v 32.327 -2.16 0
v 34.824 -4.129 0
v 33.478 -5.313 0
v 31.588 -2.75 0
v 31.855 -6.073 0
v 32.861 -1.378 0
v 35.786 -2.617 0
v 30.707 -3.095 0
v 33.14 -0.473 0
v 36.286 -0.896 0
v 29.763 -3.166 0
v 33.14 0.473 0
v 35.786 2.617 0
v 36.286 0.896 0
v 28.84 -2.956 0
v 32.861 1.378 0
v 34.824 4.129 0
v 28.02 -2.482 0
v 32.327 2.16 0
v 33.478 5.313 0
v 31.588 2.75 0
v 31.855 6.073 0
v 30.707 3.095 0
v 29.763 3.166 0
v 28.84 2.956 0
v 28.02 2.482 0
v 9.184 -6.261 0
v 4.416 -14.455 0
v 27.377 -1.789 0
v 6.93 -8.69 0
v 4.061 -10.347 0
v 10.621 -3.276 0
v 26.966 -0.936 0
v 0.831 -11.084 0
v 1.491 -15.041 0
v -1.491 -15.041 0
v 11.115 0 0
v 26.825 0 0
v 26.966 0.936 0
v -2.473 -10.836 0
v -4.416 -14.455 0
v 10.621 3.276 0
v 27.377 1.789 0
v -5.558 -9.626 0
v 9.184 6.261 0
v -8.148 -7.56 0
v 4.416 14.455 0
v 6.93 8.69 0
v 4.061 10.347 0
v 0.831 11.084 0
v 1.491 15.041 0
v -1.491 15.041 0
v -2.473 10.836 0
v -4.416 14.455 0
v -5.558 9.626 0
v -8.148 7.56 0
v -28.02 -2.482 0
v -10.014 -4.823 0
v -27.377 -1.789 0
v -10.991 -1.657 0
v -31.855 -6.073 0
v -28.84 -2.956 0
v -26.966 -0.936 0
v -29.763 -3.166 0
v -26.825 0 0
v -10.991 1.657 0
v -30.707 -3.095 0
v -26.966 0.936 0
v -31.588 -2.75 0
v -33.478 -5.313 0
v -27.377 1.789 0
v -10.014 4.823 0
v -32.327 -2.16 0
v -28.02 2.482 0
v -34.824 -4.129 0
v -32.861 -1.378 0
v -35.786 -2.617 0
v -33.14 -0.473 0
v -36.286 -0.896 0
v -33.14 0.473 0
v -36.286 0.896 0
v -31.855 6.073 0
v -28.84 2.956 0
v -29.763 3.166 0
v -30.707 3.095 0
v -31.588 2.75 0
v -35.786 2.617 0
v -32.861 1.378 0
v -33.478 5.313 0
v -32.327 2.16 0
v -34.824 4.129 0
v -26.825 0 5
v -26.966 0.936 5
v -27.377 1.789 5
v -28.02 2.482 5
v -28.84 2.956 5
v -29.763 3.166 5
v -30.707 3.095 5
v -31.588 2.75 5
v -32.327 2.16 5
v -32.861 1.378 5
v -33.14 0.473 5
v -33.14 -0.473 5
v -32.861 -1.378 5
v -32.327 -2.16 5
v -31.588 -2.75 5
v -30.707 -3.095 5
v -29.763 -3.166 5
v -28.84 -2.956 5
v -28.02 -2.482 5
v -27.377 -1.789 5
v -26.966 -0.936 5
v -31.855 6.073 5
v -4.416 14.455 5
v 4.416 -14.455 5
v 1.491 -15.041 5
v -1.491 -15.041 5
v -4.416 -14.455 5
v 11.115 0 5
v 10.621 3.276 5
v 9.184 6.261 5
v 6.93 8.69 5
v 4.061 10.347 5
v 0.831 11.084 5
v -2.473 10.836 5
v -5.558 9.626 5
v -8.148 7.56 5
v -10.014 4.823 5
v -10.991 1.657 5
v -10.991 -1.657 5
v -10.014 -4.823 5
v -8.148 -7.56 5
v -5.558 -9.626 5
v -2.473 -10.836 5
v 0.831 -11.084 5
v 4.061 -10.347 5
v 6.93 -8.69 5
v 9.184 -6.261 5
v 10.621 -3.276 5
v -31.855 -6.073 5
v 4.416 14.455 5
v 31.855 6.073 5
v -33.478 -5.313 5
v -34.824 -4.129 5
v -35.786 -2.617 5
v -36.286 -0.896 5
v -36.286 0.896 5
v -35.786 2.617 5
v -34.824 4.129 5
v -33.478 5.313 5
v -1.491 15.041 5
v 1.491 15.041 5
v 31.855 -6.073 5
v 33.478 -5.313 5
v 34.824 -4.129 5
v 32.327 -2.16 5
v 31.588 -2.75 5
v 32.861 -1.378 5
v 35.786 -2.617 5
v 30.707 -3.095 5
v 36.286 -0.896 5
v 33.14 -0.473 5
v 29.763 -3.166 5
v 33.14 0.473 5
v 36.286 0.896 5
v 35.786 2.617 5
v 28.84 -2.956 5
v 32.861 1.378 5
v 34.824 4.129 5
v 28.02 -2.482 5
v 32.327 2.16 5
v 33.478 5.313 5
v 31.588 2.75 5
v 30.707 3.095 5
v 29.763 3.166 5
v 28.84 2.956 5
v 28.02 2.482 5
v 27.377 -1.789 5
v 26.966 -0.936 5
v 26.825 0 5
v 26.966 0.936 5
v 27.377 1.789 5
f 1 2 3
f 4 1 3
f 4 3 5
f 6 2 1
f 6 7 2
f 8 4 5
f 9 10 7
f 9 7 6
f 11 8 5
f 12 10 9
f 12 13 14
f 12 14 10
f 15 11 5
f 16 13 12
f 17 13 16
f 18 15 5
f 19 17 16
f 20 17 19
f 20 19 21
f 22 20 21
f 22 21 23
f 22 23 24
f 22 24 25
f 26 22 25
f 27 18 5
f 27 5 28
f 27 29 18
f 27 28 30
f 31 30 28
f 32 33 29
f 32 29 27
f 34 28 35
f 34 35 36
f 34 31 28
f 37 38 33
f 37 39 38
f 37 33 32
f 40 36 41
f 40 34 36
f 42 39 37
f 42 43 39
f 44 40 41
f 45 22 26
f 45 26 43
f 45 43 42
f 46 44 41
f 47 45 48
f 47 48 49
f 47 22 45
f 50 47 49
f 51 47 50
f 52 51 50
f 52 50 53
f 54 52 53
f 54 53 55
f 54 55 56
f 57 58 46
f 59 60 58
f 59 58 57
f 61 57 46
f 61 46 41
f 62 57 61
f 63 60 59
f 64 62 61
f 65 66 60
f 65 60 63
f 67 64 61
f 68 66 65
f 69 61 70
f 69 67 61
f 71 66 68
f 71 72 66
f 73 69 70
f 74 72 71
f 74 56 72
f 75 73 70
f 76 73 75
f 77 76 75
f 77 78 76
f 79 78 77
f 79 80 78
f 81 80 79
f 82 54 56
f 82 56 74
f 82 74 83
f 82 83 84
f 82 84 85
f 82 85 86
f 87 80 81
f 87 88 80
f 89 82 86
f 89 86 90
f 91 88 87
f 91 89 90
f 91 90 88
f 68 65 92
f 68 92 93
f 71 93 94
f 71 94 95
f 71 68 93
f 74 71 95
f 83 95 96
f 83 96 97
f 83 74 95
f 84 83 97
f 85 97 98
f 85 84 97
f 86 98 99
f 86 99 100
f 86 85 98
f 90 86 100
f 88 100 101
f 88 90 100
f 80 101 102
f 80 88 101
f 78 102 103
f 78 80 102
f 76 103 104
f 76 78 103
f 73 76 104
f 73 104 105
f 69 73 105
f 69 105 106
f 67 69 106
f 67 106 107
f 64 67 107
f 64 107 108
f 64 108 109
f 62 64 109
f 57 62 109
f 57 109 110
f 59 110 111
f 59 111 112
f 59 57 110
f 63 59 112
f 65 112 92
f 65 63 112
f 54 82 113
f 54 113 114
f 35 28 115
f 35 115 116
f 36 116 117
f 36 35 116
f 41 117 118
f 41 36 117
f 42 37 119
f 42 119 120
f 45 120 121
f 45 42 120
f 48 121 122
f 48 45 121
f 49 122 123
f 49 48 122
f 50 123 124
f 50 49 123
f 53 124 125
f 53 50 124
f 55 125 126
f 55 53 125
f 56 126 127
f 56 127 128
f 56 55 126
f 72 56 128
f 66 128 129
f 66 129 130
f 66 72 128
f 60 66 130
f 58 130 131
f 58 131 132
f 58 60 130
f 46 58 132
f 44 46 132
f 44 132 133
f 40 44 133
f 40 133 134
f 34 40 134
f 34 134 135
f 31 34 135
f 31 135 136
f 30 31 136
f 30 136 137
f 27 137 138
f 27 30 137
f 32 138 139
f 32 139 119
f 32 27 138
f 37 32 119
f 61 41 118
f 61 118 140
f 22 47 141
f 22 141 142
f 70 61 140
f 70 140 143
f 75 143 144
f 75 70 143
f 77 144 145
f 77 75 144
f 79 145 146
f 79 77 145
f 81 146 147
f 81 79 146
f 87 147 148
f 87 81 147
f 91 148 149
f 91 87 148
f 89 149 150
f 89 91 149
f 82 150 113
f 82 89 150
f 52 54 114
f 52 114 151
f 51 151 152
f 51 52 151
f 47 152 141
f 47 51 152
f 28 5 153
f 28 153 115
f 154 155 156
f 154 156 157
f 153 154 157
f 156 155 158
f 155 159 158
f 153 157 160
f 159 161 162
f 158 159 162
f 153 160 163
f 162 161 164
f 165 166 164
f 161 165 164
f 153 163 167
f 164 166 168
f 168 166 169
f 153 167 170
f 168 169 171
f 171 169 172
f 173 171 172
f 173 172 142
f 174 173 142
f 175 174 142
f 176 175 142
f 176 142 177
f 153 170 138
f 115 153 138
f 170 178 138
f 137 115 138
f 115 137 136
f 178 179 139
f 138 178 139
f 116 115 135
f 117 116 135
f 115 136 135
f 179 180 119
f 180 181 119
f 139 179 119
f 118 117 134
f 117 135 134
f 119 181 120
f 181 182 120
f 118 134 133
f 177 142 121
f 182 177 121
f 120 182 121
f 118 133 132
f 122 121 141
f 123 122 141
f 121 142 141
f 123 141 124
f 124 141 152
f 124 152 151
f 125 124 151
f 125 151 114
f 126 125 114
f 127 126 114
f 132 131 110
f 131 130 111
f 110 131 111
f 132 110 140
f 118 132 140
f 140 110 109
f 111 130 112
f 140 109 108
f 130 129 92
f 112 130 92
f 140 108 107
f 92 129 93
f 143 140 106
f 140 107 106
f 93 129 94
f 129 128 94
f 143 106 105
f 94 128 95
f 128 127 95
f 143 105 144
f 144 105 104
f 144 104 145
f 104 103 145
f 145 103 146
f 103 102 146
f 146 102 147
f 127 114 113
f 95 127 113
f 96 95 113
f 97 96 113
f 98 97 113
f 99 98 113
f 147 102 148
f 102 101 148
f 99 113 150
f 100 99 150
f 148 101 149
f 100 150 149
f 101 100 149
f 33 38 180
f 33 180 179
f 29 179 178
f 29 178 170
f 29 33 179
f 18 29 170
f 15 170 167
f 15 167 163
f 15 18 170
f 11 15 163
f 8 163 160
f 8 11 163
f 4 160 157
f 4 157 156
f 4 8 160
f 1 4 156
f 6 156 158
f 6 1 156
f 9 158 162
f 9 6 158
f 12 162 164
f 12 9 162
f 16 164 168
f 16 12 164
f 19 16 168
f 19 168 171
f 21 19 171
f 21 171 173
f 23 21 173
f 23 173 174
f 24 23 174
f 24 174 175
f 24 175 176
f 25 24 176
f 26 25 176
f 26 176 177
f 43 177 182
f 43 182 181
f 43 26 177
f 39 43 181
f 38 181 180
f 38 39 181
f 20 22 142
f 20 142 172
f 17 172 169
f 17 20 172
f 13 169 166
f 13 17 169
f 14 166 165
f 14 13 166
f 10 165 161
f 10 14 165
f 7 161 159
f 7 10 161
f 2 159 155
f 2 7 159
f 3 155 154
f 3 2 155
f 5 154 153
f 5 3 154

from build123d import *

# Parameters (mm, degrees)
CROQUIS1_R              = 11.115
CROQUIS1_R_2            = 3.175
SALIENTE_EXTRUIR1_DEPTH = 5


with BuildPart() as part:
    # Croquis1 → Saliente-Extruir1 (new body)
    with BuildSketch(Plane.XY):
        with BuildLine():
            Line((-31.855258333, 6.072933107), (-4.416099167, 14.455493528))
            ThreePointArc((-4.416099167, 14.455493528), (0, 15.115), (4.416099167, 14.455493528))
            Line((4.416099167, 14.455493528), (31.855258333, 6.072933107))
            ThreePointArc((31.855258333, 6.072933107), (36.35, 0), (31.855258333, -6.072933107))
            Line((31.855258333, -6.072933107), (4.416099167, -14.455493528))
            ThreePointArc((4.416099167, -14.455493528), (0, -15.115), (-4.416099167, -14.455493528))
            Line((-4.416099167, -14.455493528), (-31.855258333, -6.072933107))
            ThreePointArc((-31.855258333, -6.072933107), (-36.35, 0), (-31.855258333, 6.072933107))
        make_face()
        Circle(CROQUIS1_R, mode=Mode.SUBTRACT)
        with Locations((-30, 0)):
            Circle(CROQUIS1_R_2, mode=Mode.SUBTRACT)
        with Locations(Location((30, 0, 0), (0, 0, 180))):
            Circle(CROQUIS1_R_2, mode=Mode.SUBTRACT)
    extrude(amount=SALIENTE_EXTRUIR1_DEPTH)


solid = part.part
